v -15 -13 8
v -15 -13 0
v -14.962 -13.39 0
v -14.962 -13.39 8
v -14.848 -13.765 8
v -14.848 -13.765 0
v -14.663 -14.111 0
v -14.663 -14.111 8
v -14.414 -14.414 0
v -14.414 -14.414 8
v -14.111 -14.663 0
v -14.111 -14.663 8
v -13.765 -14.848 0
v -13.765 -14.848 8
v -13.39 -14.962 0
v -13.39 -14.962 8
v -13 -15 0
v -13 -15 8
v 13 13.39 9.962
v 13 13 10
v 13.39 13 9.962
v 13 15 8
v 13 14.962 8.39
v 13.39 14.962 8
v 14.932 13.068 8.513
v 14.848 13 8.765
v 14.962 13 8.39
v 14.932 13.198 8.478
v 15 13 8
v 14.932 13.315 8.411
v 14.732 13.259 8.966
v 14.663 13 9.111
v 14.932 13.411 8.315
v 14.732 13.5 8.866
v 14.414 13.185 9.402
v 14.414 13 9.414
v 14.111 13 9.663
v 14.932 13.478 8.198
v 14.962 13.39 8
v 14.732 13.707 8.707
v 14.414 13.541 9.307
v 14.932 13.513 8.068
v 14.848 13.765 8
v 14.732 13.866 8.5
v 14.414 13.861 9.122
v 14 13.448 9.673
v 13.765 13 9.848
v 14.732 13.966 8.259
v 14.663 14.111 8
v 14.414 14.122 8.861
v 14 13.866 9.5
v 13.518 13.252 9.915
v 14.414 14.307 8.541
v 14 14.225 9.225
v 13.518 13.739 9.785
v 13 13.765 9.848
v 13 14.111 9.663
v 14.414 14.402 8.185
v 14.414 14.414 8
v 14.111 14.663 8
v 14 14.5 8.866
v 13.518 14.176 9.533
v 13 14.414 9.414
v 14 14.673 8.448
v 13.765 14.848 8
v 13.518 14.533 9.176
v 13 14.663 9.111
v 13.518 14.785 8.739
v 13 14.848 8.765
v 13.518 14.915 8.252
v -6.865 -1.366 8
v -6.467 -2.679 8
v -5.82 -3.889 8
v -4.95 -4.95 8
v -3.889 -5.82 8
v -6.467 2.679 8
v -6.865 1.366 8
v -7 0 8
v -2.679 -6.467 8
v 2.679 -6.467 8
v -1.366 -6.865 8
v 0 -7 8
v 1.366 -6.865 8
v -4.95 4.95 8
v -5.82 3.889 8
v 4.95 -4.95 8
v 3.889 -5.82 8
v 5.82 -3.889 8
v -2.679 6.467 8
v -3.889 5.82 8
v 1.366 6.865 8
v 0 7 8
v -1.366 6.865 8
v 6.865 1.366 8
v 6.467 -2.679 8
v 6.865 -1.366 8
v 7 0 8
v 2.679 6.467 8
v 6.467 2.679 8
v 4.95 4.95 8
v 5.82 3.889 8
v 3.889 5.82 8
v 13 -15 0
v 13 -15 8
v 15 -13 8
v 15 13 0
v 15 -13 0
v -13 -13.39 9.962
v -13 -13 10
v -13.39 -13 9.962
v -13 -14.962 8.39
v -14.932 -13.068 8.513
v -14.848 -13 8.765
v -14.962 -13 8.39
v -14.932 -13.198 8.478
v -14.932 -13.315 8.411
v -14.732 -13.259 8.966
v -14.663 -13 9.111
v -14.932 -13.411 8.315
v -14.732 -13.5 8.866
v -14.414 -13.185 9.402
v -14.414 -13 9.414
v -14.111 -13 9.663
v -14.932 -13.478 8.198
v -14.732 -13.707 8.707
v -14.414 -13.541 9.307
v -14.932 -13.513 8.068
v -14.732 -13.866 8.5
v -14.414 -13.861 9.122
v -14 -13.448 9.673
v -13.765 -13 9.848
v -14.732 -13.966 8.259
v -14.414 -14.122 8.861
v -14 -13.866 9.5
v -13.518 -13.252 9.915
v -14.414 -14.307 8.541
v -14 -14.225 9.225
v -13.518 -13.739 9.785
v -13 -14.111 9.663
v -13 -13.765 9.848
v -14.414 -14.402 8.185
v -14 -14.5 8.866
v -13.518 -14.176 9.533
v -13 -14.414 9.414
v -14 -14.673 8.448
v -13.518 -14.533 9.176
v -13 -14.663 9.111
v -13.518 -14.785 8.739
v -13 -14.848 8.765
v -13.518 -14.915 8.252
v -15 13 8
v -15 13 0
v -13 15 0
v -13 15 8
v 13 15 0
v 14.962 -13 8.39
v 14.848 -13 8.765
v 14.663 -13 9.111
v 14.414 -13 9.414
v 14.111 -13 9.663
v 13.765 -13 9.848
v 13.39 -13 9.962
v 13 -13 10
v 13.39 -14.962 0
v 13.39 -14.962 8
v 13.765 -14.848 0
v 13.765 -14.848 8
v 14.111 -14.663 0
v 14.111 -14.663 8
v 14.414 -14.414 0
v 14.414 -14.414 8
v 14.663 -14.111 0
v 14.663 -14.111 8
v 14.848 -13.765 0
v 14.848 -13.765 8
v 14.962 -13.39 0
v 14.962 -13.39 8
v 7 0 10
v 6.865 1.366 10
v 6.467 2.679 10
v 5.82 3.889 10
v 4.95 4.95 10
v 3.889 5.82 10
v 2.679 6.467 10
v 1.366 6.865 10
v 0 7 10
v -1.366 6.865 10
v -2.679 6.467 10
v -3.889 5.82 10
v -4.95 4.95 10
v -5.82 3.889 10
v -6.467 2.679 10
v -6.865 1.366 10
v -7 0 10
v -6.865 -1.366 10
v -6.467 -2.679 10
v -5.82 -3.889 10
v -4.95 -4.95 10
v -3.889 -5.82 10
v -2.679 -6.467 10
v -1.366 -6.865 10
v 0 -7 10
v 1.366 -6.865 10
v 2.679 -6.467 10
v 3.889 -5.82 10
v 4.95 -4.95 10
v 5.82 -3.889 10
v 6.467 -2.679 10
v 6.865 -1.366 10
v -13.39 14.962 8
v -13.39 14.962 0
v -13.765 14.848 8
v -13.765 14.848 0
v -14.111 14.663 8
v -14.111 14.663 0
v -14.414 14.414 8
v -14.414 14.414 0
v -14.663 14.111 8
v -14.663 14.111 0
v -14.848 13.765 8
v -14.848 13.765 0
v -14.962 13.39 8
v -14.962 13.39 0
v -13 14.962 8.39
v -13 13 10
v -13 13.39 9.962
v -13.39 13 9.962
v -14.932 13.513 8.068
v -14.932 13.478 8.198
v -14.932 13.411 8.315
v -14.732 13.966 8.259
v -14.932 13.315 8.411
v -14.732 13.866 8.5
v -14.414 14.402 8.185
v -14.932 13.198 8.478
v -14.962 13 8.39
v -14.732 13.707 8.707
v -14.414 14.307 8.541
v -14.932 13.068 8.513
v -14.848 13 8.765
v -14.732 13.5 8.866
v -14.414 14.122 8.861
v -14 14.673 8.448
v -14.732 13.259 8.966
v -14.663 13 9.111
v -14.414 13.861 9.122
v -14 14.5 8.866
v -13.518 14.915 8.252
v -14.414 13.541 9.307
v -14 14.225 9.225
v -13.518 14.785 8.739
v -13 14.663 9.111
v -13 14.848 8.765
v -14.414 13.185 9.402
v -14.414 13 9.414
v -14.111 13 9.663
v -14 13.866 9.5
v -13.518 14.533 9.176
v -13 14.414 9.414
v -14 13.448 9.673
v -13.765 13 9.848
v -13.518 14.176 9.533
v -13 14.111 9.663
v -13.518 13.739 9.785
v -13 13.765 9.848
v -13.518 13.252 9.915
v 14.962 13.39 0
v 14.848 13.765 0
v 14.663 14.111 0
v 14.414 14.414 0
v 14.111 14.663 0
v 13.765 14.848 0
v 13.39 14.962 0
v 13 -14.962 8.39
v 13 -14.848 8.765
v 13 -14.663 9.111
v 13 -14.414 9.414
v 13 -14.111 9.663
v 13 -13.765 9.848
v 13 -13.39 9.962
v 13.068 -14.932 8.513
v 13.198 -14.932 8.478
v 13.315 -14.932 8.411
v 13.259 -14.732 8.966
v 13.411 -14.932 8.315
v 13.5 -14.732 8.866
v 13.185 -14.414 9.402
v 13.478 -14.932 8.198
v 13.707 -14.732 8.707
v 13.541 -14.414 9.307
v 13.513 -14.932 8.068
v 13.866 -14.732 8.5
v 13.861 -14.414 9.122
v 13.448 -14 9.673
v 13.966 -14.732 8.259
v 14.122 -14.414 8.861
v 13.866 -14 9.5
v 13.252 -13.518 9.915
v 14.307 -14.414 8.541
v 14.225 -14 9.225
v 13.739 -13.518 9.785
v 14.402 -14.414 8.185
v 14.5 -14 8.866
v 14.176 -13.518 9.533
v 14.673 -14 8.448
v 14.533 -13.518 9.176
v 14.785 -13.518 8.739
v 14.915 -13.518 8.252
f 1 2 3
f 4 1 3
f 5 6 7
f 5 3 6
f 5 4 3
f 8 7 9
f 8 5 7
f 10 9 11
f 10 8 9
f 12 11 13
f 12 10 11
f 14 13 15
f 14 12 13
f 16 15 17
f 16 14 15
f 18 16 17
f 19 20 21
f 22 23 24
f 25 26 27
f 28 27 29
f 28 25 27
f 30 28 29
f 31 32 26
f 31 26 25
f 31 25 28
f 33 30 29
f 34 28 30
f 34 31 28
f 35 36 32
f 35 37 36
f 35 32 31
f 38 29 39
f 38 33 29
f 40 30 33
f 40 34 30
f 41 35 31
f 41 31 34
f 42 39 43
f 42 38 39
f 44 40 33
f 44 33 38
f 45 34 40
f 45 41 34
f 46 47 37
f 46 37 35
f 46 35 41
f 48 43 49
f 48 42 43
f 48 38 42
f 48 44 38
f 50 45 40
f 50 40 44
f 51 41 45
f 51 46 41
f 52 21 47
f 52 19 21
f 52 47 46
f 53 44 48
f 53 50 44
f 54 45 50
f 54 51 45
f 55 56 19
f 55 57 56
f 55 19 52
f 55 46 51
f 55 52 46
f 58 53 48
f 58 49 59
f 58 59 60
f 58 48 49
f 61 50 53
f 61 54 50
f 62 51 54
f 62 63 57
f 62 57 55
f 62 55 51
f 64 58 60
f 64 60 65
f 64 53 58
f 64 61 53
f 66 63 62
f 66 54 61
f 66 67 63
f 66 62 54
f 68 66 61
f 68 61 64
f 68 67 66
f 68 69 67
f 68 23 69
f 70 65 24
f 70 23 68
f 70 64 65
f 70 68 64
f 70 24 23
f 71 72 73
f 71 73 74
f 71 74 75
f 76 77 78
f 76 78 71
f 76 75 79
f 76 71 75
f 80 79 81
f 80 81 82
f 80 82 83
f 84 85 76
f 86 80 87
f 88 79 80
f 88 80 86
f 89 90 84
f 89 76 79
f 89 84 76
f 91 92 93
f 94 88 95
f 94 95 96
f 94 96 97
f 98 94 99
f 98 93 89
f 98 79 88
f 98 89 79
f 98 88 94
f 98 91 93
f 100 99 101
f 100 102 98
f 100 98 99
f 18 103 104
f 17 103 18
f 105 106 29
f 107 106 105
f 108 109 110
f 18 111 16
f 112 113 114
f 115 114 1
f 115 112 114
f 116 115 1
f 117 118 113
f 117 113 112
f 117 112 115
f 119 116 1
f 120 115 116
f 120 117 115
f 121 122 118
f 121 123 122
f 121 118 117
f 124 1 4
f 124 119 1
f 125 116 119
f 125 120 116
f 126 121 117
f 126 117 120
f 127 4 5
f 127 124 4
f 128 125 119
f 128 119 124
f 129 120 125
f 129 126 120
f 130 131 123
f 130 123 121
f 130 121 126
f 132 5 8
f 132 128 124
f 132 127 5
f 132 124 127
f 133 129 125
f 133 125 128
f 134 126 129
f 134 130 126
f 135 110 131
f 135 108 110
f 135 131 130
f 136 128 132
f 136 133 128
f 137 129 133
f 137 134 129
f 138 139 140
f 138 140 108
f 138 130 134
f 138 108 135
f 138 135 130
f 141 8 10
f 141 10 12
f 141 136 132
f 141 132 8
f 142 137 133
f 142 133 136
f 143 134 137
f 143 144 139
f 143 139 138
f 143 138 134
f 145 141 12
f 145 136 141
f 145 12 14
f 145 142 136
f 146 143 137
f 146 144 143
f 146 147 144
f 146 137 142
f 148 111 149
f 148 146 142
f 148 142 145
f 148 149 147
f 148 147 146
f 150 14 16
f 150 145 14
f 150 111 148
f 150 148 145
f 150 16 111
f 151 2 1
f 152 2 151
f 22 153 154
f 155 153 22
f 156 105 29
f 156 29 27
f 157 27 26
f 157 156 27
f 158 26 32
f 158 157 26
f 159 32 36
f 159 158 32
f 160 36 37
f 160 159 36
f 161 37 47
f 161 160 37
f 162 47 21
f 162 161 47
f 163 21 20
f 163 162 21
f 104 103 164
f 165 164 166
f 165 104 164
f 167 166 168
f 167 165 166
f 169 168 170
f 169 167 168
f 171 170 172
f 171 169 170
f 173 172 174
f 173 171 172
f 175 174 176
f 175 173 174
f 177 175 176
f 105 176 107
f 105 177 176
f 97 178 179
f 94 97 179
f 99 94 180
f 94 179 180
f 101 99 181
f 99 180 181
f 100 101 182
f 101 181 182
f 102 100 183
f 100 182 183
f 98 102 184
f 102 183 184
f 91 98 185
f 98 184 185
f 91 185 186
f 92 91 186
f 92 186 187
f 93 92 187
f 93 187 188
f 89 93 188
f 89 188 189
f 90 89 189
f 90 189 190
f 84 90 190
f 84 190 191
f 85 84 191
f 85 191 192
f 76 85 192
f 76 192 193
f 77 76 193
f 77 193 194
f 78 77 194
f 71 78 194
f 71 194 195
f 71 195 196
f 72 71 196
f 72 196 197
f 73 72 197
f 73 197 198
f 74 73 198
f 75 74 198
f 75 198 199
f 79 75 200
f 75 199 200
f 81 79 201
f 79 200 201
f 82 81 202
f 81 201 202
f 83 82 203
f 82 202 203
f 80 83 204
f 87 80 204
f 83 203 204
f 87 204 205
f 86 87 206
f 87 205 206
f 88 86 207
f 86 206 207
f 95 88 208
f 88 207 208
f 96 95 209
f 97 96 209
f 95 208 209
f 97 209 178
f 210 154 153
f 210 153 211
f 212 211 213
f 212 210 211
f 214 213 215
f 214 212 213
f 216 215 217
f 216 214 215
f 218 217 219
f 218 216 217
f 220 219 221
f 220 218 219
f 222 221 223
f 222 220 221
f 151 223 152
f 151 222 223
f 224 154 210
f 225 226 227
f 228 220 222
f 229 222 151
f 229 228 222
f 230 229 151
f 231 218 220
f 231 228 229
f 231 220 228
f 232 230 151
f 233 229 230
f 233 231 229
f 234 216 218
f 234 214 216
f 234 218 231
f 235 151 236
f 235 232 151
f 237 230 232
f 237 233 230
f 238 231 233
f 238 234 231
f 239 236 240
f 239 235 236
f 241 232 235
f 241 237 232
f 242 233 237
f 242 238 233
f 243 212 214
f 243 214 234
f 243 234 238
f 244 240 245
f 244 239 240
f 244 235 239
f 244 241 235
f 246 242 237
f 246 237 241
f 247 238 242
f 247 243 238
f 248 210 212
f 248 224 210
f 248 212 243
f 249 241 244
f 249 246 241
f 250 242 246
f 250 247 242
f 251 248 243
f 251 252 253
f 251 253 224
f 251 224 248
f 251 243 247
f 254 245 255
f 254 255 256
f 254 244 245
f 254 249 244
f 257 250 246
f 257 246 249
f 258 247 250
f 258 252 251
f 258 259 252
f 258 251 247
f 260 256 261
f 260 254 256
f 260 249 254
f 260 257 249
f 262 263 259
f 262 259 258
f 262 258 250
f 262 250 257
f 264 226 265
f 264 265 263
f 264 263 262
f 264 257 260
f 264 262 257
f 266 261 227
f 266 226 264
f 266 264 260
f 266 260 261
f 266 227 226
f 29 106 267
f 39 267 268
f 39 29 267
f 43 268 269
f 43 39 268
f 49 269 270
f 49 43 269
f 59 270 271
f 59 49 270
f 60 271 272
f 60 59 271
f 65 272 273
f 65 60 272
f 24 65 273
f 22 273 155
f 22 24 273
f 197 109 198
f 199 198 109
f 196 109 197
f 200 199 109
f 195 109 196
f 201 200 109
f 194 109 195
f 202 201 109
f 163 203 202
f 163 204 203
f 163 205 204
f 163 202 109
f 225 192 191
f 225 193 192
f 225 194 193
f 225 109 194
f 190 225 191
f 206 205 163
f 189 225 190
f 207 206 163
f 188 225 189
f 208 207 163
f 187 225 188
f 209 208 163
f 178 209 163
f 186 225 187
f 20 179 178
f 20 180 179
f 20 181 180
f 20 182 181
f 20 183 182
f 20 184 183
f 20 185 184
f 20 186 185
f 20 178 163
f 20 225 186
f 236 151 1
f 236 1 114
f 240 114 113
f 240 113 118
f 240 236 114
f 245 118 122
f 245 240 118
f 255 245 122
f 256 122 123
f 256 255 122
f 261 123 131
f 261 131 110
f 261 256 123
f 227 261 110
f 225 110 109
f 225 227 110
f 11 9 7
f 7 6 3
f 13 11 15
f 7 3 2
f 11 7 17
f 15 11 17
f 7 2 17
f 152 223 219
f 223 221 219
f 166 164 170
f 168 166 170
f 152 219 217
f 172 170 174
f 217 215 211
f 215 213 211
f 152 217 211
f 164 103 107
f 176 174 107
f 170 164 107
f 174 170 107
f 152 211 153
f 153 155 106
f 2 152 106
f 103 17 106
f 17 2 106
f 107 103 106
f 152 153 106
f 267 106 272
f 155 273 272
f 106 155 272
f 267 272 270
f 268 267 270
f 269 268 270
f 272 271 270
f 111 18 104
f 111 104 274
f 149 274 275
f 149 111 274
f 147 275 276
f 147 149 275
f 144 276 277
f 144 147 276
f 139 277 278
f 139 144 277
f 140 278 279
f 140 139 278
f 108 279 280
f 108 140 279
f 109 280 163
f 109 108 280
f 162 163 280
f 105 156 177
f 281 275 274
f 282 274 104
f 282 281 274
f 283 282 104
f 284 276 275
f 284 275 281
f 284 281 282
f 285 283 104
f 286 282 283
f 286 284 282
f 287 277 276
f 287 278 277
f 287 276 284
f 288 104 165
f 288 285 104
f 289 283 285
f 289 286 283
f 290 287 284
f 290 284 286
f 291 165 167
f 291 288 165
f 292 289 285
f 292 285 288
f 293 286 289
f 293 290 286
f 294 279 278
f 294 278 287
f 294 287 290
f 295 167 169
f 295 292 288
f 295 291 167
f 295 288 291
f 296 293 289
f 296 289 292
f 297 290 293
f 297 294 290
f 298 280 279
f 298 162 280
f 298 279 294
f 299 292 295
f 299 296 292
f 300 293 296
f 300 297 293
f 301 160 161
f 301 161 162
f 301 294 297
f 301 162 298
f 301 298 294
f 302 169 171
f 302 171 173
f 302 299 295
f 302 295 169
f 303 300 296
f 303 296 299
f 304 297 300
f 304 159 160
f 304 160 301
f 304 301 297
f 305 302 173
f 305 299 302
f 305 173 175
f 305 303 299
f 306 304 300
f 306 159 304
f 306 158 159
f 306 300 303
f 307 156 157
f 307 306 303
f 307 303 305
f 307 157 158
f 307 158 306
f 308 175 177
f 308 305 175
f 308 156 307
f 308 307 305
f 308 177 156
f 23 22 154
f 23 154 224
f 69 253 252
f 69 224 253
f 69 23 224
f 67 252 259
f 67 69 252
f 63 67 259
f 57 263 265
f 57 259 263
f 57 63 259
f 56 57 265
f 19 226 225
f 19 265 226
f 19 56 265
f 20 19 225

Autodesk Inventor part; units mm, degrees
ref_plane "YZ Plane" through (0, 0, 0) normal (1, 0, 0) x (0, 1, 0)
ref_plane "XZ Plane" through (0, 0, 0) normal (0, 1, 0) x (-1, 0, 0)
ref_plane "XY Plane" through (0, 0, 0) normal (0, 0, 1) x (1, 0, 0)
sketch "Sketch1" plane through (0, 0, 0) normal (0, 0, 1) x (1, 0, 0)
  line L0 (15, -15) -> (-15, -15)
  line L1 (-15, -15) -> (-15, 15)
  line L2 (-15, 15) -> (15, 15)
  line L3 (15, 15) -> (15, -15)
  line L4 (15, -15) -> (-15, 15) construction
  line L5 (-15, -15) -> (15, 15) construction
  point P0 (0, 0)
  dimension "d0" = 30
  dimension "d1" = 30
extrude "Extrusion1" add sketch "Sketch1" along normal blind 10
sketch "Sketch2" plane through (0, 0, 10) normal (0, 0, 1) x (1, 0, 0)
  circle A0 centre (0, 0) radius 7
  dimension "d4" = 14
extrude "Extrusion2" cut sketch "Sketch2" against normal blind 2
fillet "Fillet1" radius 2 8 edges at (0, 15, 10) (15, 0, 10) (15, 15, 5) (15, -15, 5) (0, -15, 10) (-15, -15, 5) (-15, 0, 10) (-15, 15, 5)
properties part number "potentiometer body"
